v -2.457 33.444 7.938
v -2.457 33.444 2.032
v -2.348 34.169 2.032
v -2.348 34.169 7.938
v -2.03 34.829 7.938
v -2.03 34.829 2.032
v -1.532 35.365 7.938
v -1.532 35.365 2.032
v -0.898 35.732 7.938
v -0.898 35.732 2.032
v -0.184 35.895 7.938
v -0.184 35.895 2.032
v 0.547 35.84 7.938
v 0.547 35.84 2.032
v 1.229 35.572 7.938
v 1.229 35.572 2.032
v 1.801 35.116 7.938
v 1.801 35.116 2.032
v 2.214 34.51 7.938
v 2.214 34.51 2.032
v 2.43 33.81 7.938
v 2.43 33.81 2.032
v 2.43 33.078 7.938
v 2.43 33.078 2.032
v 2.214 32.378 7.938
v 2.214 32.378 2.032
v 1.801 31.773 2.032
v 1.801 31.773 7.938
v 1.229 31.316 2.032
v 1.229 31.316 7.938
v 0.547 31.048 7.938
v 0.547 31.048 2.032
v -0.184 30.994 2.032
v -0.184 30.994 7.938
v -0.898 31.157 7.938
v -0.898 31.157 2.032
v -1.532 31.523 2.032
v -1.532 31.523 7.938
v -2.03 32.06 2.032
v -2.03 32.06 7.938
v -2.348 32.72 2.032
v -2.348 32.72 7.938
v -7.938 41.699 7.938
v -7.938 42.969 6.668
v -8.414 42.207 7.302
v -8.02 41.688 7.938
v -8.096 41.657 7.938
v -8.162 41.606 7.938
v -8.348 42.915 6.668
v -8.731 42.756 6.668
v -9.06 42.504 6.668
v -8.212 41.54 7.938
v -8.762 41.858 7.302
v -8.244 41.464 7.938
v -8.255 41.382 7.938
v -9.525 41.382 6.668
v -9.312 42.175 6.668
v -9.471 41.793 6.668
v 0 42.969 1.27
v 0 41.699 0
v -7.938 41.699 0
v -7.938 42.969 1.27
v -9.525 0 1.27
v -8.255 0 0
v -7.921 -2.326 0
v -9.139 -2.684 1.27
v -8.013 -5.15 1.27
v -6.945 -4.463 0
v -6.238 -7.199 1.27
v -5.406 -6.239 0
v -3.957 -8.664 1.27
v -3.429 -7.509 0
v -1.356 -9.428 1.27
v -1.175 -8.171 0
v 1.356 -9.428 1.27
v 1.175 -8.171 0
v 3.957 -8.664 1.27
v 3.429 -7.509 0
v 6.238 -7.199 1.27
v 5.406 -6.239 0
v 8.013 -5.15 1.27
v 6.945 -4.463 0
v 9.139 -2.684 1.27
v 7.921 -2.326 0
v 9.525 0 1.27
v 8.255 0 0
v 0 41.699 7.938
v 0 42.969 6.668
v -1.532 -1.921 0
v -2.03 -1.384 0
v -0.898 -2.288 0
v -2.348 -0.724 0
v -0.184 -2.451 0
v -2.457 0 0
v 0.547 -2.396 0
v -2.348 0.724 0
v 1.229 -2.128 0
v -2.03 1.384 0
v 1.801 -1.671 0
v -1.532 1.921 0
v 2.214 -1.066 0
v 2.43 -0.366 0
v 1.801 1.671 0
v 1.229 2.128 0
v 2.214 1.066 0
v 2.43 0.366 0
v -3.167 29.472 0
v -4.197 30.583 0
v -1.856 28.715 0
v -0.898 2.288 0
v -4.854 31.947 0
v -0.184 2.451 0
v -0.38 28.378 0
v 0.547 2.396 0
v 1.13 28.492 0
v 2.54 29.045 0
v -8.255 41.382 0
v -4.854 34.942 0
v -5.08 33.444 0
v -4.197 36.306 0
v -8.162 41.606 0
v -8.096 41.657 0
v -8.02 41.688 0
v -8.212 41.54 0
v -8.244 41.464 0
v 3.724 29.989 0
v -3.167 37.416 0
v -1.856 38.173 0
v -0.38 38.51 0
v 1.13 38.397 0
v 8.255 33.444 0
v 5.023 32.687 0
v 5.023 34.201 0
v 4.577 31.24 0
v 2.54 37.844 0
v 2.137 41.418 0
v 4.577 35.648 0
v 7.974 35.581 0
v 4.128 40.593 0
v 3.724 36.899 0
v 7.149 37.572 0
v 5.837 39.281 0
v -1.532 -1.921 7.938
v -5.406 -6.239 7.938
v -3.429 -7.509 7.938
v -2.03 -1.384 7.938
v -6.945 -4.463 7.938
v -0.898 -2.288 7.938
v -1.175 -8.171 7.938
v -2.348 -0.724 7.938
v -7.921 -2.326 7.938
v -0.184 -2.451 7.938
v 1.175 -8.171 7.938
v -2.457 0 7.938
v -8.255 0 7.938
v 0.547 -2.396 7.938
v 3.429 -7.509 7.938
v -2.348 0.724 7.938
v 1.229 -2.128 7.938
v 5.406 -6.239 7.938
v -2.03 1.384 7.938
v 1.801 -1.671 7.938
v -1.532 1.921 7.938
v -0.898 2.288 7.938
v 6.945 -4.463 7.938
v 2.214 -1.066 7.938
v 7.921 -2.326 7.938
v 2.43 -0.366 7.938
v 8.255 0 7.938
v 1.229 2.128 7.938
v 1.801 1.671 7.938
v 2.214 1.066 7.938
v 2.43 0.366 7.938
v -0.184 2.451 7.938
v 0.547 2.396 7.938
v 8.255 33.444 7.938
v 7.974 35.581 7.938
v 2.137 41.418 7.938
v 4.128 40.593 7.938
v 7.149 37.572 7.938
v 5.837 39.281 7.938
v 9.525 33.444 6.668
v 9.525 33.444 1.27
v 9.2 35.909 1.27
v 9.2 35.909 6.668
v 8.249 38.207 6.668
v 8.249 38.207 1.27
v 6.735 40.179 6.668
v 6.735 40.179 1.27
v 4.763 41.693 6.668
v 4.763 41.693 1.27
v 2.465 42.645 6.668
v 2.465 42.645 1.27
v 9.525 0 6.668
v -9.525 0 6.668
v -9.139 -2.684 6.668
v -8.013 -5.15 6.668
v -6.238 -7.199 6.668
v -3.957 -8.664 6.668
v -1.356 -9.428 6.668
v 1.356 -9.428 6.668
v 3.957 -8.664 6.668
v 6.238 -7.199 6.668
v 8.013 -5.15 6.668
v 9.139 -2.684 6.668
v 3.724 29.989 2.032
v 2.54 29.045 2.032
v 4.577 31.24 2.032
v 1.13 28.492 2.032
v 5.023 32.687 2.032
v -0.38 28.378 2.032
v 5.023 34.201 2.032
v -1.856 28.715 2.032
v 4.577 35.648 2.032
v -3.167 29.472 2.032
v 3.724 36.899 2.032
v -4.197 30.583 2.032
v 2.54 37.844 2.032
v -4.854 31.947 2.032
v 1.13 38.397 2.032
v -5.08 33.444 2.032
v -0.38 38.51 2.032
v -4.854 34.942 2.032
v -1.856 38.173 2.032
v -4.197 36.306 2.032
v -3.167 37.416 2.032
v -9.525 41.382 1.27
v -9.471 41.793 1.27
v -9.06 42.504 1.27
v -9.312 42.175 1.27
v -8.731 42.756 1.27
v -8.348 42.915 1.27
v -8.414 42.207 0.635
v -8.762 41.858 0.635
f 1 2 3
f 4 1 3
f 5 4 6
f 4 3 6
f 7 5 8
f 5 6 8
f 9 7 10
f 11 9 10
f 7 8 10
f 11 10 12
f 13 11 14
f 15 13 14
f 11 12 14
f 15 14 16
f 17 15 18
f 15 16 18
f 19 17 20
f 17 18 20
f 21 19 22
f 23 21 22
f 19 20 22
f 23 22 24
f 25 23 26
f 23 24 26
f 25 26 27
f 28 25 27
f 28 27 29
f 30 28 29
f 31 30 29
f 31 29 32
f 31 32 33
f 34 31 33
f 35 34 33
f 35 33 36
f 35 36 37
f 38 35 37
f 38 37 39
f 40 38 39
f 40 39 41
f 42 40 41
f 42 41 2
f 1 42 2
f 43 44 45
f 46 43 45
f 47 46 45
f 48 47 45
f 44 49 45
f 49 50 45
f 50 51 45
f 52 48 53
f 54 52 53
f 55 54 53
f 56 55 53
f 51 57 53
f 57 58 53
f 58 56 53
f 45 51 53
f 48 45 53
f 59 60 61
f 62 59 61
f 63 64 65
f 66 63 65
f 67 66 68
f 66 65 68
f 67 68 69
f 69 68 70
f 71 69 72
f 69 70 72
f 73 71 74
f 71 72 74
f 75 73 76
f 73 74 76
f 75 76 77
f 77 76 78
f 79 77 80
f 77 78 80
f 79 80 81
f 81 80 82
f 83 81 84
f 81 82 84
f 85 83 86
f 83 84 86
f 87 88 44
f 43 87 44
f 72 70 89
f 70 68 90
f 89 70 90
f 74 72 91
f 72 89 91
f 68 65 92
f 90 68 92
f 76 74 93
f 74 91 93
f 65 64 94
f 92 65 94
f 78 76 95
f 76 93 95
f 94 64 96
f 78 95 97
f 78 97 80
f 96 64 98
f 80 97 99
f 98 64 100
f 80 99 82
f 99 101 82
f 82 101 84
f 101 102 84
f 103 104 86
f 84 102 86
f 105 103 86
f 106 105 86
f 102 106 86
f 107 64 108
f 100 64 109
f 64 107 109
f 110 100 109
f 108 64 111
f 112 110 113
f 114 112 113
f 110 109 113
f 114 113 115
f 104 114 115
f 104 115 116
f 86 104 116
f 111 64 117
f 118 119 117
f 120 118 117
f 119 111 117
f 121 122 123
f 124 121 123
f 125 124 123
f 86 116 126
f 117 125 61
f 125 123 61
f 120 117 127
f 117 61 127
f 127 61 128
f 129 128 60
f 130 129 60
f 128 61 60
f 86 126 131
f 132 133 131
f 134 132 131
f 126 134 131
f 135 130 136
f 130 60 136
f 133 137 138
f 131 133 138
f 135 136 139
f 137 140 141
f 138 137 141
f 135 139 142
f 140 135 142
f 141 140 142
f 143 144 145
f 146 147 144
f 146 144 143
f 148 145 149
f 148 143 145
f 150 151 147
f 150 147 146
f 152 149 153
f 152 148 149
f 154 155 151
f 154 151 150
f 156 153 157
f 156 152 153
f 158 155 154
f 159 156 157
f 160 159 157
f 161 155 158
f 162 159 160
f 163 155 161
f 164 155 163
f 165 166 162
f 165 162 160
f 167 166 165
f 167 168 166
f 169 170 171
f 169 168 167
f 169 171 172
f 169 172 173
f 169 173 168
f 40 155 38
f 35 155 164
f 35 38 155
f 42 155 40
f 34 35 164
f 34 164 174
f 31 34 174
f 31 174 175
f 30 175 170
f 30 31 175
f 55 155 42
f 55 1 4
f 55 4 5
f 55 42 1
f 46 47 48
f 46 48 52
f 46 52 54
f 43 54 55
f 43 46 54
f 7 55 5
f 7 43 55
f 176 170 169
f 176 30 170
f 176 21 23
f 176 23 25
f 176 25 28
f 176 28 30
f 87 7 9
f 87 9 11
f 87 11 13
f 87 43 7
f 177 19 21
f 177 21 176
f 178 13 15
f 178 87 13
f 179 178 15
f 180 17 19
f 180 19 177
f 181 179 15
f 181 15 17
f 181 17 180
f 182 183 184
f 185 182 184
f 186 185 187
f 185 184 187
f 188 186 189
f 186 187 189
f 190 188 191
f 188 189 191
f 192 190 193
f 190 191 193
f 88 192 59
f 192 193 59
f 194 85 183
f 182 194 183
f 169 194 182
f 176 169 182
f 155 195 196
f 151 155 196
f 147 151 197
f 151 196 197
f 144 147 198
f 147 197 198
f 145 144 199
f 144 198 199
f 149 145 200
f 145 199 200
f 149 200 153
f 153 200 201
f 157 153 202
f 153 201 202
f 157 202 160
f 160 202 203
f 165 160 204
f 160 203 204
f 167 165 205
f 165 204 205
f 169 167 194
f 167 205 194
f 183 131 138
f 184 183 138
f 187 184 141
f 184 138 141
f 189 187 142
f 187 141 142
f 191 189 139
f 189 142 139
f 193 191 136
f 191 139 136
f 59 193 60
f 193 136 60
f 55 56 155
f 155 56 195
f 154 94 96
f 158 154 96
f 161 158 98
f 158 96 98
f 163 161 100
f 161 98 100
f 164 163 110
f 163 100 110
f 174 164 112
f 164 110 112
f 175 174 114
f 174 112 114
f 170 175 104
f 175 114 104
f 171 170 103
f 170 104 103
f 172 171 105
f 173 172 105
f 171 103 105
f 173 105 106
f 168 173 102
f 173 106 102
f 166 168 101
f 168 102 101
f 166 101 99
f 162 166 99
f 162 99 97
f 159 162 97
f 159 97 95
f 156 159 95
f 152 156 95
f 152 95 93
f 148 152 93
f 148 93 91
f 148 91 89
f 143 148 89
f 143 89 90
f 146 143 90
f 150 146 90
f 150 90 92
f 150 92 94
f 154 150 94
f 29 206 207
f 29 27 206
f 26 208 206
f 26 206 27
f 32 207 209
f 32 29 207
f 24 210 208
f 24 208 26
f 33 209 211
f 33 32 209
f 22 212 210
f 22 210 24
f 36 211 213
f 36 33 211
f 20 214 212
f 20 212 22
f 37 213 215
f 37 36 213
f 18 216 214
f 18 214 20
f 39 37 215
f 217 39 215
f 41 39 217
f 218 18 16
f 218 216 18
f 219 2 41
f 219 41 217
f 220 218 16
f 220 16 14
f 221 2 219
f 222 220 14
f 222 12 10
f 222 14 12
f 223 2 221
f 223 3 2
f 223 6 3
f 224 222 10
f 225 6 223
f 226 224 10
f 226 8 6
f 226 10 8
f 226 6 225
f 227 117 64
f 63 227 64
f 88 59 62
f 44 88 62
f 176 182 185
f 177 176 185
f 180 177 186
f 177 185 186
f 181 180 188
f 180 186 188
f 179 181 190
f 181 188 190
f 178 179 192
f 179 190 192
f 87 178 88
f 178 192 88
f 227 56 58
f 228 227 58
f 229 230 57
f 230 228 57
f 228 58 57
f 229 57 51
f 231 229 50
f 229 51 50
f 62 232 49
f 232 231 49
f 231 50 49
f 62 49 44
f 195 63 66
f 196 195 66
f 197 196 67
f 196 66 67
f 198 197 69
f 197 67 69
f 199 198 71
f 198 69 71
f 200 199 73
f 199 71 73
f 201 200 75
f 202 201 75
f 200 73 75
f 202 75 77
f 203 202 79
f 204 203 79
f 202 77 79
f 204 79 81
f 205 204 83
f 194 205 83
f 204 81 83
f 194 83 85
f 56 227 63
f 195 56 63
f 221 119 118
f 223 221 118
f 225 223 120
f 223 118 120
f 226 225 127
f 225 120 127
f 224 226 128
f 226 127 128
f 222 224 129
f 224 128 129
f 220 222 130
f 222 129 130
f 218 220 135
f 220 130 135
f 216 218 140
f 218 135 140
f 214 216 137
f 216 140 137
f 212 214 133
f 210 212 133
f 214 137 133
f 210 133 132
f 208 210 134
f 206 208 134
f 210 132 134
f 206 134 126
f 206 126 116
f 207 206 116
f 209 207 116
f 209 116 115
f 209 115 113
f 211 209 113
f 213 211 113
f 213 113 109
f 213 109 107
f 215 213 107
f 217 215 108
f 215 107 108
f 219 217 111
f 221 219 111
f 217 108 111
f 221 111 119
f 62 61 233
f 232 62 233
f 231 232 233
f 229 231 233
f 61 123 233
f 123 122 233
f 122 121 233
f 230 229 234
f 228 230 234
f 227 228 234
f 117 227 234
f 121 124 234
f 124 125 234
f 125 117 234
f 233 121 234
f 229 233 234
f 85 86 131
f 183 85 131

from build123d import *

# Parameters (mm, degrees)
BOSS_EXTRUDE1_DEPTH   = 7.9375
F_8_CLEARANCE_HOLE1_D = 4.9149
F_8_CLEARANCE_HOLE2_D = 4.9149
SKETCH7_R             = 5.08
CUT_EXTRUDE1_DEPTH    = 2.032
FILLET1_R             = 1.5875
CHAMFER2_SIZE         = 1.27


with BuildPart() as part:
    # Sketch2 → Boss-Extrude1 (new body)
    with BuildSketch(Plane.XY):
        with BuildLine():
            Line((-9.525, 42.96918), (-9.525, 0))
            ThreePointArc((-9.525, 0), (0, -9.525), (9.525, 0))
            Line((9.525, 0), (9.525, 33.44418))
            ThreePointArc((9.525, 33.44418), (6.735192091, 40.179372091), (0, 42.96918))
            Line((0, 42.96918), (-9.525, 42.96918))
        make_face()
    extrude(amount=BOSS_EXTRUDE1_DEPTH)

    # #8 Clearance Hole1 (through all)
    with Locations(Plane.XY.offset(7.9375)):
        with Locations((0, 0)):
            Hole(F_8_CLEARANCE_HOLE1_D / 2)

    # #8 Clearance Hole2 (through all)
    with Locations(Plane.XY.offset(7.9375)):
        with Locations((0, 33.44418)):
            Hole(F_8_CLEARANCE_HOLE2_D / 2)

    # Sketch7 → Cut-Extrude1 (cut)
    with BuildSketch(Plane(origin=(0, 0, 0), x_dir=(-1, 0, 0), z_dir=(0, 0, -1))):
        with Locations((0, 33.44418)):
            Circle(SKETCH7_R)
    extrude(amount=-CUT_EXTRUDE1_DEPTH, mode=Mode.SUBTRACT)

    # Fillet1
    fillet1_edges = [part.edges().sort_by_distance(p)[0] for p in [
        (-9.525, 42.96918, 3.96875),
    ]]
    fillet(fillet1_edges, radius=FILLET1_R)

    # Chamfer2
    chamfer2_edges = [part.edges().sort_by_distance(p)[0] for p in [
        (6.735192091, 40.179372091, 7.9375),
        (-3.96875, 42.96918, 7.9375),
        (-9.525, 20.69084, 0),
        (-9.525, 20.69084, 7.9375),
        (-9.060032015, 42.504212015, 0),
        (-9.060032015, 42.504212015, 7.9375),
        (0, -9.525, 7.9375),
        (-3.96875, 42.96918, 0),
        (6.735192091, 40.179372091, 0),
        (9.525, 16.72209, 0),
        (0, -9.525, 0),
        (9.525, 16.72209, 7.9375),
    ]]
    chamfer(chamfer2_edges, length=CHAMFER2_SIZE)


solid = part.part
